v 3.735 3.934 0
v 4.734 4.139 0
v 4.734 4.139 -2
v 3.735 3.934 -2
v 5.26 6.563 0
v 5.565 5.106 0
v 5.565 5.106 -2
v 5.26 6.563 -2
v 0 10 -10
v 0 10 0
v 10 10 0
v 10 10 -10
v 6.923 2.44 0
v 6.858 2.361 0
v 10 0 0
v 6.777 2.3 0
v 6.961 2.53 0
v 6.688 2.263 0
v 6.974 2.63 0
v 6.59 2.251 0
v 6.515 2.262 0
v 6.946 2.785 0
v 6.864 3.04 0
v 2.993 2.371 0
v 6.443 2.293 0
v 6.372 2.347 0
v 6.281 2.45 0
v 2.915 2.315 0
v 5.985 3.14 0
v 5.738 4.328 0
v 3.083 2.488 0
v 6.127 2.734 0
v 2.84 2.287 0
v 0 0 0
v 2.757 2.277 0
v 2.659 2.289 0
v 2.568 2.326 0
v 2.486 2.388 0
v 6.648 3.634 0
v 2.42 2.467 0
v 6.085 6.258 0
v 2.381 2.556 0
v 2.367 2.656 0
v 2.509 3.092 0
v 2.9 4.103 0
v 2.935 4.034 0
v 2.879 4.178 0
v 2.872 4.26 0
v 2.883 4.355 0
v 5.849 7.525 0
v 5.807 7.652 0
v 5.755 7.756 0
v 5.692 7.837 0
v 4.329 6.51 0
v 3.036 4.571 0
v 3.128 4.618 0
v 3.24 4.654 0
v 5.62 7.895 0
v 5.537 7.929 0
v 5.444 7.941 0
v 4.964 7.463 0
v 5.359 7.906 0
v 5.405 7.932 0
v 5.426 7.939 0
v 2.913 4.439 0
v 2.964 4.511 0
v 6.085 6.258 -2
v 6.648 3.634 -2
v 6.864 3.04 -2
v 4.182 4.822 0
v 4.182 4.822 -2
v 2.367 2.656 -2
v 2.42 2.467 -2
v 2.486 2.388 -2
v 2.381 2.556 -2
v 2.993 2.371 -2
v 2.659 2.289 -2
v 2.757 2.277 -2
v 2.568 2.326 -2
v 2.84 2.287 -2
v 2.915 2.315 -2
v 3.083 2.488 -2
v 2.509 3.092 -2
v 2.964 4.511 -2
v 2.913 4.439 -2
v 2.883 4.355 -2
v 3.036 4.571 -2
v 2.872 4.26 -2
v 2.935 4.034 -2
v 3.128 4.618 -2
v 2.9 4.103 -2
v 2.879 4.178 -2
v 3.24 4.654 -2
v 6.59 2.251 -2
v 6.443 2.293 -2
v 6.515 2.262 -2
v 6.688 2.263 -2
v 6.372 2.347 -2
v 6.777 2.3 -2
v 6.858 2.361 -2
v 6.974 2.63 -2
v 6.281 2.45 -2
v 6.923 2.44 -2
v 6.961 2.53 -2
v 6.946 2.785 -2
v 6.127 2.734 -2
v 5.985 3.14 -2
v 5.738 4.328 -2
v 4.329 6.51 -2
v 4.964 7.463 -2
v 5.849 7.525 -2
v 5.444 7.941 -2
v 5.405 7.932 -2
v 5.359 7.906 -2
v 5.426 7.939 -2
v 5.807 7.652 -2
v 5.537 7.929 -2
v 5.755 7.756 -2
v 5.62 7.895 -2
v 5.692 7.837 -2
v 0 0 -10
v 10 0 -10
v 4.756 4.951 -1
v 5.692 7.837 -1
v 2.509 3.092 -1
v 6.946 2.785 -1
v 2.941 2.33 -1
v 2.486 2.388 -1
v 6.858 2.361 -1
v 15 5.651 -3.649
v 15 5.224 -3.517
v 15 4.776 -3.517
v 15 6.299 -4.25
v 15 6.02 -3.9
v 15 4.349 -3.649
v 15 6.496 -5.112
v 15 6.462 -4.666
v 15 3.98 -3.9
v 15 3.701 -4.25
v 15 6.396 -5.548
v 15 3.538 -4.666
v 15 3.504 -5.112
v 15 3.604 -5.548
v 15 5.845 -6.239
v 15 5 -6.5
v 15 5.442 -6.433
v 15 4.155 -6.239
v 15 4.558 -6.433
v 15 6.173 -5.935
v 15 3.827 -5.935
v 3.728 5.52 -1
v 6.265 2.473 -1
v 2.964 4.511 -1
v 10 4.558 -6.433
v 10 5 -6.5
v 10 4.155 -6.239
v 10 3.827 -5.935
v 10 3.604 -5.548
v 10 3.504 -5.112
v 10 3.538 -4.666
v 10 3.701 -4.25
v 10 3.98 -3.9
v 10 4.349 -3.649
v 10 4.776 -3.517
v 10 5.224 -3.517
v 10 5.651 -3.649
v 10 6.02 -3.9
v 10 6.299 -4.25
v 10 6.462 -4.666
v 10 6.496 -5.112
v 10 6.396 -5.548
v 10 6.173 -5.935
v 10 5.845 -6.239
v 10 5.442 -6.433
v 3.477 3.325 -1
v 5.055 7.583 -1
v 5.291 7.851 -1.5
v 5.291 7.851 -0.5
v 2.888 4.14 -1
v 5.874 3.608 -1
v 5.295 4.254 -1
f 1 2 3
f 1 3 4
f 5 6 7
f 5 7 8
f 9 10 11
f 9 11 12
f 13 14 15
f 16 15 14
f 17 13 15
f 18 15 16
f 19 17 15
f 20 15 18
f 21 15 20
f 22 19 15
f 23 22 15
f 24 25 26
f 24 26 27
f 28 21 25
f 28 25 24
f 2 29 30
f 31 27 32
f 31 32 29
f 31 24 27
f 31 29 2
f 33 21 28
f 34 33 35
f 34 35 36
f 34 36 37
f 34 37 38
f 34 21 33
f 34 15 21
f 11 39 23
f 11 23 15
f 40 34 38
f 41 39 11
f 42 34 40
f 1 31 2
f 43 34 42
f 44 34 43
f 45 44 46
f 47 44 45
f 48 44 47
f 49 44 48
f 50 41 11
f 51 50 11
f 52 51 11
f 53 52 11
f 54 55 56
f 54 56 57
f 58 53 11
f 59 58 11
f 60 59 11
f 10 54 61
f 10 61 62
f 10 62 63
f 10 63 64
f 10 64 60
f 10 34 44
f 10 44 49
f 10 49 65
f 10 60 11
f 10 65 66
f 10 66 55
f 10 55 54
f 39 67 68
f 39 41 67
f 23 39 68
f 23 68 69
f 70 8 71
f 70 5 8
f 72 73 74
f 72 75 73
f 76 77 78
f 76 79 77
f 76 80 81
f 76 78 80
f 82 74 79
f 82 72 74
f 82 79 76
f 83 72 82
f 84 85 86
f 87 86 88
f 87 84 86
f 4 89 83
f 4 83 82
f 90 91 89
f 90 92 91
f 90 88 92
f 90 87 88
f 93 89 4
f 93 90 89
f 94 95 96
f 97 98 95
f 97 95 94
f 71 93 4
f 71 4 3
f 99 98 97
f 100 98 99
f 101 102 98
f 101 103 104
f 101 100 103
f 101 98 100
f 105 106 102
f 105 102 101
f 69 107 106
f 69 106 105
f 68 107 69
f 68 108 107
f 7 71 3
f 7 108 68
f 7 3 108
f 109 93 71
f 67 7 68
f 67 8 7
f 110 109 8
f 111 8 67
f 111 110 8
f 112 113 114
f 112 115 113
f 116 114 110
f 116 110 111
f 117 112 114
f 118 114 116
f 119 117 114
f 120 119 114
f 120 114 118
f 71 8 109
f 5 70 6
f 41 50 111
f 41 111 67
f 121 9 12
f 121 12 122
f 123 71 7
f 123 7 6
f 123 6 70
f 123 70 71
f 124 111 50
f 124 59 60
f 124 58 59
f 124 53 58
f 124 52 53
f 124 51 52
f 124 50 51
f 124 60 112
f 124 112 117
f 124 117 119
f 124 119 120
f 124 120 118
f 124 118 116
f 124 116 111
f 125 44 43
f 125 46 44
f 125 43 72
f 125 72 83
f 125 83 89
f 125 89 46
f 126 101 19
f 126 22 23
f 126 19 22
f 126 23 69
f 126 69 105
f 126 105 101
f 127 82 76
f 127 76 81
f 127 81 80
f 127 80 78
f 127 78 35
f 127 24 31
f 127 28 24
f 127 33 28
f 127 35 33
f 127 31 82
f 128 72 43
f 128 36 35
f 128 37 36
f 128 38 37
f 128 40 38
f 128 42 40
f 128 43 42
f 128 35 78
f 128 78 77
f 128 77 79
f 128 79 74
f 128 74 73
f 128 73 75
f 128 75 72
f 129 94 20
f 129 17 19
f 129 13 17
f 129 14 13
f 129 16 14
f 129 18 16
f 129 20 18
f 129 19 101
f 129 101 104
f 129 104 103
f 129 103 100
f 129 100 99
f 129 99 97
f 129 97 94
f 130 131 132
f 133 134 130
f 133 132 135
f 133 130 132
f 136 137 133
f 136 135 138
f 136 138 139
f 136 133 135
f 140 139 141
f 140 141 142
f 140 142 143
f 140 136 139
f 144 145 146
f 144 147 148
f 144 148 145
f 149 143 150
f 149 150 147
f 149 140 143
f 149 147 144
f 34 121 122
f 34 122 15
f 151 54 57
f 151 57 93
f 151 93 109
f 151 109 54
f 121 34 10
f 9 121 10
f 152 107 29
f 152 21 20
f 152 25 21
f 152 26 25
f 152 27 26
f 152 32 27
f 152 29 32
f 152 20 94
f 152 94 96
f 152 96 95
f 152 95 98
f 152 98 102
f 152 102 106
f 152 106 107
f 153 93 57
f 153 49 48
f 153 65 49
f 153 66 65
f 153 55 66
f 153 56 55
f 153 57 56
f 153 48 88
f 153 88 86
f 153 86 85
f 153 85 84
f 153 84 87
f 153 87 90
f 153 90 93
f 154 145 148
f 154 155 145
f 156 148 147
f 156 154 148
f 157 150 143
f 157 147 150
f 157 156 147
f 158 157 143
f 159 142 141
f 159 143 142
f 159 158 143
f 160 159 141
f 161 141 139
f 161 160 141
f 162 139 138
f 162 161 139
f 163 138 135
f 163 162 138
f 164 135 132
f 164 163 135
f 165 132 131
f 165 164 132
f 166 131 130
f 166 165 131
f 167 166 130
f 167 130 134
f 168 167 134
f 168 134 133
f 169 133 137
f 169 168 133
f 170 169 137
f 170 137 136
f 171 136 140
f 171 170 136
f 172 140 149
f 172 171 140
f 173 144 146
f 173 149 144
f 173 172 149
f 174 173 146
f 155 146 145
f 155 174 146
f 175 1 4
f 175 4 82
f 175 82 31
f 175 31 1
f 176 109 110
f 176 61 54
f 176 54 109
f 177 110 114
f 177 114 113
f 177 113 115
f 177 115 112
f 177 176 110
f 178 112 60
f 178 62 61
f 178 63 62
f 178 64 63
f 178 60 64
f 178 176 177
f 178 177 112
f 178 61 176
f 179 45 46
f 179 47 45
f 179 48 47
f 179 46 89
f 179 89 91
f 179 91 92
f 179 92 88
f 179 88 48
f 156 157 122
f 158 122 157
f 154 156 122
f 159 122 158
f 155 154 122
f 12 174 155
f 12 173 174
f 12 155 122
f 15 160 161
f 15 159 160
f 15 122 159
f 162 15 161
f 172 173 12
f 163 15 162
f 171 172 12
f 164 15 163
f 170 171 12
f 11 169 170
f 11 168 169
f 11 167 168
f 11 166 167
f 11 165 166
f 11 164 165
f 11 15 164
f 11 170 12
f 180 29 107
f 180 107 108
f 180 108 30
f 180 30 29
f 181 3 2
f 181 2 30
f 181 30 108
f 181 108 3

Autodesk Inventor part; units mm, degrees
ref_plane "YZ Plane" through (0, 0, 0) normal (1, 0, 0) x (0, 1, 0)
ref_plane "XZ Plane" through (0, 0, 0) normal (0, 1, 0) x (-1, 0, 0)
ref_plane "XY Plane" through (0, 0, 0) normal (0, 0, 1) x (1, 0, 0)
sketch "Sketch1" plane through (0, 0, 0) normal (1, 0, 0) x (0, 1, 0)
  line L0 (0, 0) -> (10, 0)
  line L1 (10, 0) -> (10, -10)
  line L2 (10, -10) -> (0, -10)
  line L3 (0, -10) -> (0, 0)
  dimension "d0" = 10
  dimension "d1" = 10
extrude "Extrusion1" add sketch "Sketch1" along normal blind 10
sketch "Sketch2" plane through (10, 0, 0) normal (1, 0, 0) x (0, 0, -1)
  circle A0 centre (5, 5) radius 1.5
  point P0 (0, 0)
  dimension "d4" = 3
extrude "Extrusion2" add sketch "Sketch2" along normal blind 5
sketch "Sketch4" plane through (0, 0, 0) normal (0, 0, 1) x (1, 0, 0)
  line L0 (1.8731, 7.9408) -> (4.4271, 7.9408) construction
  line L1 (4.4271, 7.9408) -> (4.4271, 4.8928) construction
  line L2 (4.4271, 4.8928) -> (1.8731, 4.8928) construction
  line L3 (1.8731, 4.8928) -> (1.8731, 7.9408) construction
  spline S0 degree 2 poles (6.5901, 2.2509) (6.243, 2.2509) (5.9854, 3.1396) knots 0 0 0 1 1 1
  spline S1 degree 2 poles (5.9854, 3.1396) (5.8854, 3.4814) (5.7382, 4.3281) knots 0 0 0 1 1 1
  spline S2 degree 2 poles (5.7382, 4.3281) (5.3543, 4.2755) (4.7338, 4.1388) knots 0 0 0 1 1 1
  line L4 (4.7338, 4.1388) -> (3.7347, 3.9337)
  spline S3 degree 2 poles (3.7347, 3.9337) (3.5454, 3.4394) (3.0826, 2.4876) knots 0 0 0 1 1 1
  spline S4 degree 2 poles (3.0826, 2.4876) (2.9617, 2.2772) (2.7566, 2.2772) knots 0 0 0 1 1 1
  spline S5 degree 2 poles (2.7566, 2.2772) (2.6041, 2.2772) (2.3674, 2.4981) (2.3674, 2.6558) knots 0 0 0 1 2 2 2
  spline S6 degree 2 poles (2.3674, 2.6558) (2.3674, 2.8399) (2.9354, 4.0336) knots 0 0 0 1 1 1
  spline S7 degree 2 poles (2.9354, 4.0336) (2.8723, 4.1335) (2.8723, 4.2597) knots 0 0 0 1 1 1
  spline S8 degree 2 poles (2.8723, 4.2597) (2.8723, 4.5647) (3.2404, 4.6541) knots 0 0 0 1 1 1
  spline S9 degree 2 poles (3.2404, 4.6541) (3.6716, 5.4587) (4.3289, 6.5104) knots 0 0 0 1 1 1
  spline S10 degree 2 poles (4.3289, 6.5104) (5.2229, 7.9408) (5.4437, 7.9408) knots 0 0 0 1 1 1
  spline S11 degree 2 poles (5.4437, 7.9408) (5.7382, 7.9408) (5.8486, 7.5253) knots 0 0 0 1 1 1
  line L5 (5.8486, 7.5253) -> (6.0853, 6.258)
  line L6 (6.0853, 6.258) -> (6.6479, 3.6339)
  line L7 (6.6479, 3.6339) -> (6.8636, 3.0397)
  spline S12 degree 2 poles (6.8636, 3.0397) (6.974, 2.7347) (6.974, 2.6296) knots 0 0 0 1 1 1
  spline S13 degree 2 poles (6.974, 2.6296) (6.974, 2.4718) (6.7426, 2.2509) (6.5901, 2.2509) knots 0 0 0 1 2 2 2
  line L8 (5.2597, 6.563) -> (4.1817, 4.8224)
  spline S14 degree 2 poles (4.1817, 4.8224) (4.6392, 4.9381) (5.5647, 5.1064) knots 0 0 0 1 1 1
  line L9 (5.5647, 5.1064) -> (5.2597, 6.563)
  point P0 (0, 0)
extrude "Extrusion4" cut sketch "Sketch4" against normal blind 2
properties part number "Adenosine"
